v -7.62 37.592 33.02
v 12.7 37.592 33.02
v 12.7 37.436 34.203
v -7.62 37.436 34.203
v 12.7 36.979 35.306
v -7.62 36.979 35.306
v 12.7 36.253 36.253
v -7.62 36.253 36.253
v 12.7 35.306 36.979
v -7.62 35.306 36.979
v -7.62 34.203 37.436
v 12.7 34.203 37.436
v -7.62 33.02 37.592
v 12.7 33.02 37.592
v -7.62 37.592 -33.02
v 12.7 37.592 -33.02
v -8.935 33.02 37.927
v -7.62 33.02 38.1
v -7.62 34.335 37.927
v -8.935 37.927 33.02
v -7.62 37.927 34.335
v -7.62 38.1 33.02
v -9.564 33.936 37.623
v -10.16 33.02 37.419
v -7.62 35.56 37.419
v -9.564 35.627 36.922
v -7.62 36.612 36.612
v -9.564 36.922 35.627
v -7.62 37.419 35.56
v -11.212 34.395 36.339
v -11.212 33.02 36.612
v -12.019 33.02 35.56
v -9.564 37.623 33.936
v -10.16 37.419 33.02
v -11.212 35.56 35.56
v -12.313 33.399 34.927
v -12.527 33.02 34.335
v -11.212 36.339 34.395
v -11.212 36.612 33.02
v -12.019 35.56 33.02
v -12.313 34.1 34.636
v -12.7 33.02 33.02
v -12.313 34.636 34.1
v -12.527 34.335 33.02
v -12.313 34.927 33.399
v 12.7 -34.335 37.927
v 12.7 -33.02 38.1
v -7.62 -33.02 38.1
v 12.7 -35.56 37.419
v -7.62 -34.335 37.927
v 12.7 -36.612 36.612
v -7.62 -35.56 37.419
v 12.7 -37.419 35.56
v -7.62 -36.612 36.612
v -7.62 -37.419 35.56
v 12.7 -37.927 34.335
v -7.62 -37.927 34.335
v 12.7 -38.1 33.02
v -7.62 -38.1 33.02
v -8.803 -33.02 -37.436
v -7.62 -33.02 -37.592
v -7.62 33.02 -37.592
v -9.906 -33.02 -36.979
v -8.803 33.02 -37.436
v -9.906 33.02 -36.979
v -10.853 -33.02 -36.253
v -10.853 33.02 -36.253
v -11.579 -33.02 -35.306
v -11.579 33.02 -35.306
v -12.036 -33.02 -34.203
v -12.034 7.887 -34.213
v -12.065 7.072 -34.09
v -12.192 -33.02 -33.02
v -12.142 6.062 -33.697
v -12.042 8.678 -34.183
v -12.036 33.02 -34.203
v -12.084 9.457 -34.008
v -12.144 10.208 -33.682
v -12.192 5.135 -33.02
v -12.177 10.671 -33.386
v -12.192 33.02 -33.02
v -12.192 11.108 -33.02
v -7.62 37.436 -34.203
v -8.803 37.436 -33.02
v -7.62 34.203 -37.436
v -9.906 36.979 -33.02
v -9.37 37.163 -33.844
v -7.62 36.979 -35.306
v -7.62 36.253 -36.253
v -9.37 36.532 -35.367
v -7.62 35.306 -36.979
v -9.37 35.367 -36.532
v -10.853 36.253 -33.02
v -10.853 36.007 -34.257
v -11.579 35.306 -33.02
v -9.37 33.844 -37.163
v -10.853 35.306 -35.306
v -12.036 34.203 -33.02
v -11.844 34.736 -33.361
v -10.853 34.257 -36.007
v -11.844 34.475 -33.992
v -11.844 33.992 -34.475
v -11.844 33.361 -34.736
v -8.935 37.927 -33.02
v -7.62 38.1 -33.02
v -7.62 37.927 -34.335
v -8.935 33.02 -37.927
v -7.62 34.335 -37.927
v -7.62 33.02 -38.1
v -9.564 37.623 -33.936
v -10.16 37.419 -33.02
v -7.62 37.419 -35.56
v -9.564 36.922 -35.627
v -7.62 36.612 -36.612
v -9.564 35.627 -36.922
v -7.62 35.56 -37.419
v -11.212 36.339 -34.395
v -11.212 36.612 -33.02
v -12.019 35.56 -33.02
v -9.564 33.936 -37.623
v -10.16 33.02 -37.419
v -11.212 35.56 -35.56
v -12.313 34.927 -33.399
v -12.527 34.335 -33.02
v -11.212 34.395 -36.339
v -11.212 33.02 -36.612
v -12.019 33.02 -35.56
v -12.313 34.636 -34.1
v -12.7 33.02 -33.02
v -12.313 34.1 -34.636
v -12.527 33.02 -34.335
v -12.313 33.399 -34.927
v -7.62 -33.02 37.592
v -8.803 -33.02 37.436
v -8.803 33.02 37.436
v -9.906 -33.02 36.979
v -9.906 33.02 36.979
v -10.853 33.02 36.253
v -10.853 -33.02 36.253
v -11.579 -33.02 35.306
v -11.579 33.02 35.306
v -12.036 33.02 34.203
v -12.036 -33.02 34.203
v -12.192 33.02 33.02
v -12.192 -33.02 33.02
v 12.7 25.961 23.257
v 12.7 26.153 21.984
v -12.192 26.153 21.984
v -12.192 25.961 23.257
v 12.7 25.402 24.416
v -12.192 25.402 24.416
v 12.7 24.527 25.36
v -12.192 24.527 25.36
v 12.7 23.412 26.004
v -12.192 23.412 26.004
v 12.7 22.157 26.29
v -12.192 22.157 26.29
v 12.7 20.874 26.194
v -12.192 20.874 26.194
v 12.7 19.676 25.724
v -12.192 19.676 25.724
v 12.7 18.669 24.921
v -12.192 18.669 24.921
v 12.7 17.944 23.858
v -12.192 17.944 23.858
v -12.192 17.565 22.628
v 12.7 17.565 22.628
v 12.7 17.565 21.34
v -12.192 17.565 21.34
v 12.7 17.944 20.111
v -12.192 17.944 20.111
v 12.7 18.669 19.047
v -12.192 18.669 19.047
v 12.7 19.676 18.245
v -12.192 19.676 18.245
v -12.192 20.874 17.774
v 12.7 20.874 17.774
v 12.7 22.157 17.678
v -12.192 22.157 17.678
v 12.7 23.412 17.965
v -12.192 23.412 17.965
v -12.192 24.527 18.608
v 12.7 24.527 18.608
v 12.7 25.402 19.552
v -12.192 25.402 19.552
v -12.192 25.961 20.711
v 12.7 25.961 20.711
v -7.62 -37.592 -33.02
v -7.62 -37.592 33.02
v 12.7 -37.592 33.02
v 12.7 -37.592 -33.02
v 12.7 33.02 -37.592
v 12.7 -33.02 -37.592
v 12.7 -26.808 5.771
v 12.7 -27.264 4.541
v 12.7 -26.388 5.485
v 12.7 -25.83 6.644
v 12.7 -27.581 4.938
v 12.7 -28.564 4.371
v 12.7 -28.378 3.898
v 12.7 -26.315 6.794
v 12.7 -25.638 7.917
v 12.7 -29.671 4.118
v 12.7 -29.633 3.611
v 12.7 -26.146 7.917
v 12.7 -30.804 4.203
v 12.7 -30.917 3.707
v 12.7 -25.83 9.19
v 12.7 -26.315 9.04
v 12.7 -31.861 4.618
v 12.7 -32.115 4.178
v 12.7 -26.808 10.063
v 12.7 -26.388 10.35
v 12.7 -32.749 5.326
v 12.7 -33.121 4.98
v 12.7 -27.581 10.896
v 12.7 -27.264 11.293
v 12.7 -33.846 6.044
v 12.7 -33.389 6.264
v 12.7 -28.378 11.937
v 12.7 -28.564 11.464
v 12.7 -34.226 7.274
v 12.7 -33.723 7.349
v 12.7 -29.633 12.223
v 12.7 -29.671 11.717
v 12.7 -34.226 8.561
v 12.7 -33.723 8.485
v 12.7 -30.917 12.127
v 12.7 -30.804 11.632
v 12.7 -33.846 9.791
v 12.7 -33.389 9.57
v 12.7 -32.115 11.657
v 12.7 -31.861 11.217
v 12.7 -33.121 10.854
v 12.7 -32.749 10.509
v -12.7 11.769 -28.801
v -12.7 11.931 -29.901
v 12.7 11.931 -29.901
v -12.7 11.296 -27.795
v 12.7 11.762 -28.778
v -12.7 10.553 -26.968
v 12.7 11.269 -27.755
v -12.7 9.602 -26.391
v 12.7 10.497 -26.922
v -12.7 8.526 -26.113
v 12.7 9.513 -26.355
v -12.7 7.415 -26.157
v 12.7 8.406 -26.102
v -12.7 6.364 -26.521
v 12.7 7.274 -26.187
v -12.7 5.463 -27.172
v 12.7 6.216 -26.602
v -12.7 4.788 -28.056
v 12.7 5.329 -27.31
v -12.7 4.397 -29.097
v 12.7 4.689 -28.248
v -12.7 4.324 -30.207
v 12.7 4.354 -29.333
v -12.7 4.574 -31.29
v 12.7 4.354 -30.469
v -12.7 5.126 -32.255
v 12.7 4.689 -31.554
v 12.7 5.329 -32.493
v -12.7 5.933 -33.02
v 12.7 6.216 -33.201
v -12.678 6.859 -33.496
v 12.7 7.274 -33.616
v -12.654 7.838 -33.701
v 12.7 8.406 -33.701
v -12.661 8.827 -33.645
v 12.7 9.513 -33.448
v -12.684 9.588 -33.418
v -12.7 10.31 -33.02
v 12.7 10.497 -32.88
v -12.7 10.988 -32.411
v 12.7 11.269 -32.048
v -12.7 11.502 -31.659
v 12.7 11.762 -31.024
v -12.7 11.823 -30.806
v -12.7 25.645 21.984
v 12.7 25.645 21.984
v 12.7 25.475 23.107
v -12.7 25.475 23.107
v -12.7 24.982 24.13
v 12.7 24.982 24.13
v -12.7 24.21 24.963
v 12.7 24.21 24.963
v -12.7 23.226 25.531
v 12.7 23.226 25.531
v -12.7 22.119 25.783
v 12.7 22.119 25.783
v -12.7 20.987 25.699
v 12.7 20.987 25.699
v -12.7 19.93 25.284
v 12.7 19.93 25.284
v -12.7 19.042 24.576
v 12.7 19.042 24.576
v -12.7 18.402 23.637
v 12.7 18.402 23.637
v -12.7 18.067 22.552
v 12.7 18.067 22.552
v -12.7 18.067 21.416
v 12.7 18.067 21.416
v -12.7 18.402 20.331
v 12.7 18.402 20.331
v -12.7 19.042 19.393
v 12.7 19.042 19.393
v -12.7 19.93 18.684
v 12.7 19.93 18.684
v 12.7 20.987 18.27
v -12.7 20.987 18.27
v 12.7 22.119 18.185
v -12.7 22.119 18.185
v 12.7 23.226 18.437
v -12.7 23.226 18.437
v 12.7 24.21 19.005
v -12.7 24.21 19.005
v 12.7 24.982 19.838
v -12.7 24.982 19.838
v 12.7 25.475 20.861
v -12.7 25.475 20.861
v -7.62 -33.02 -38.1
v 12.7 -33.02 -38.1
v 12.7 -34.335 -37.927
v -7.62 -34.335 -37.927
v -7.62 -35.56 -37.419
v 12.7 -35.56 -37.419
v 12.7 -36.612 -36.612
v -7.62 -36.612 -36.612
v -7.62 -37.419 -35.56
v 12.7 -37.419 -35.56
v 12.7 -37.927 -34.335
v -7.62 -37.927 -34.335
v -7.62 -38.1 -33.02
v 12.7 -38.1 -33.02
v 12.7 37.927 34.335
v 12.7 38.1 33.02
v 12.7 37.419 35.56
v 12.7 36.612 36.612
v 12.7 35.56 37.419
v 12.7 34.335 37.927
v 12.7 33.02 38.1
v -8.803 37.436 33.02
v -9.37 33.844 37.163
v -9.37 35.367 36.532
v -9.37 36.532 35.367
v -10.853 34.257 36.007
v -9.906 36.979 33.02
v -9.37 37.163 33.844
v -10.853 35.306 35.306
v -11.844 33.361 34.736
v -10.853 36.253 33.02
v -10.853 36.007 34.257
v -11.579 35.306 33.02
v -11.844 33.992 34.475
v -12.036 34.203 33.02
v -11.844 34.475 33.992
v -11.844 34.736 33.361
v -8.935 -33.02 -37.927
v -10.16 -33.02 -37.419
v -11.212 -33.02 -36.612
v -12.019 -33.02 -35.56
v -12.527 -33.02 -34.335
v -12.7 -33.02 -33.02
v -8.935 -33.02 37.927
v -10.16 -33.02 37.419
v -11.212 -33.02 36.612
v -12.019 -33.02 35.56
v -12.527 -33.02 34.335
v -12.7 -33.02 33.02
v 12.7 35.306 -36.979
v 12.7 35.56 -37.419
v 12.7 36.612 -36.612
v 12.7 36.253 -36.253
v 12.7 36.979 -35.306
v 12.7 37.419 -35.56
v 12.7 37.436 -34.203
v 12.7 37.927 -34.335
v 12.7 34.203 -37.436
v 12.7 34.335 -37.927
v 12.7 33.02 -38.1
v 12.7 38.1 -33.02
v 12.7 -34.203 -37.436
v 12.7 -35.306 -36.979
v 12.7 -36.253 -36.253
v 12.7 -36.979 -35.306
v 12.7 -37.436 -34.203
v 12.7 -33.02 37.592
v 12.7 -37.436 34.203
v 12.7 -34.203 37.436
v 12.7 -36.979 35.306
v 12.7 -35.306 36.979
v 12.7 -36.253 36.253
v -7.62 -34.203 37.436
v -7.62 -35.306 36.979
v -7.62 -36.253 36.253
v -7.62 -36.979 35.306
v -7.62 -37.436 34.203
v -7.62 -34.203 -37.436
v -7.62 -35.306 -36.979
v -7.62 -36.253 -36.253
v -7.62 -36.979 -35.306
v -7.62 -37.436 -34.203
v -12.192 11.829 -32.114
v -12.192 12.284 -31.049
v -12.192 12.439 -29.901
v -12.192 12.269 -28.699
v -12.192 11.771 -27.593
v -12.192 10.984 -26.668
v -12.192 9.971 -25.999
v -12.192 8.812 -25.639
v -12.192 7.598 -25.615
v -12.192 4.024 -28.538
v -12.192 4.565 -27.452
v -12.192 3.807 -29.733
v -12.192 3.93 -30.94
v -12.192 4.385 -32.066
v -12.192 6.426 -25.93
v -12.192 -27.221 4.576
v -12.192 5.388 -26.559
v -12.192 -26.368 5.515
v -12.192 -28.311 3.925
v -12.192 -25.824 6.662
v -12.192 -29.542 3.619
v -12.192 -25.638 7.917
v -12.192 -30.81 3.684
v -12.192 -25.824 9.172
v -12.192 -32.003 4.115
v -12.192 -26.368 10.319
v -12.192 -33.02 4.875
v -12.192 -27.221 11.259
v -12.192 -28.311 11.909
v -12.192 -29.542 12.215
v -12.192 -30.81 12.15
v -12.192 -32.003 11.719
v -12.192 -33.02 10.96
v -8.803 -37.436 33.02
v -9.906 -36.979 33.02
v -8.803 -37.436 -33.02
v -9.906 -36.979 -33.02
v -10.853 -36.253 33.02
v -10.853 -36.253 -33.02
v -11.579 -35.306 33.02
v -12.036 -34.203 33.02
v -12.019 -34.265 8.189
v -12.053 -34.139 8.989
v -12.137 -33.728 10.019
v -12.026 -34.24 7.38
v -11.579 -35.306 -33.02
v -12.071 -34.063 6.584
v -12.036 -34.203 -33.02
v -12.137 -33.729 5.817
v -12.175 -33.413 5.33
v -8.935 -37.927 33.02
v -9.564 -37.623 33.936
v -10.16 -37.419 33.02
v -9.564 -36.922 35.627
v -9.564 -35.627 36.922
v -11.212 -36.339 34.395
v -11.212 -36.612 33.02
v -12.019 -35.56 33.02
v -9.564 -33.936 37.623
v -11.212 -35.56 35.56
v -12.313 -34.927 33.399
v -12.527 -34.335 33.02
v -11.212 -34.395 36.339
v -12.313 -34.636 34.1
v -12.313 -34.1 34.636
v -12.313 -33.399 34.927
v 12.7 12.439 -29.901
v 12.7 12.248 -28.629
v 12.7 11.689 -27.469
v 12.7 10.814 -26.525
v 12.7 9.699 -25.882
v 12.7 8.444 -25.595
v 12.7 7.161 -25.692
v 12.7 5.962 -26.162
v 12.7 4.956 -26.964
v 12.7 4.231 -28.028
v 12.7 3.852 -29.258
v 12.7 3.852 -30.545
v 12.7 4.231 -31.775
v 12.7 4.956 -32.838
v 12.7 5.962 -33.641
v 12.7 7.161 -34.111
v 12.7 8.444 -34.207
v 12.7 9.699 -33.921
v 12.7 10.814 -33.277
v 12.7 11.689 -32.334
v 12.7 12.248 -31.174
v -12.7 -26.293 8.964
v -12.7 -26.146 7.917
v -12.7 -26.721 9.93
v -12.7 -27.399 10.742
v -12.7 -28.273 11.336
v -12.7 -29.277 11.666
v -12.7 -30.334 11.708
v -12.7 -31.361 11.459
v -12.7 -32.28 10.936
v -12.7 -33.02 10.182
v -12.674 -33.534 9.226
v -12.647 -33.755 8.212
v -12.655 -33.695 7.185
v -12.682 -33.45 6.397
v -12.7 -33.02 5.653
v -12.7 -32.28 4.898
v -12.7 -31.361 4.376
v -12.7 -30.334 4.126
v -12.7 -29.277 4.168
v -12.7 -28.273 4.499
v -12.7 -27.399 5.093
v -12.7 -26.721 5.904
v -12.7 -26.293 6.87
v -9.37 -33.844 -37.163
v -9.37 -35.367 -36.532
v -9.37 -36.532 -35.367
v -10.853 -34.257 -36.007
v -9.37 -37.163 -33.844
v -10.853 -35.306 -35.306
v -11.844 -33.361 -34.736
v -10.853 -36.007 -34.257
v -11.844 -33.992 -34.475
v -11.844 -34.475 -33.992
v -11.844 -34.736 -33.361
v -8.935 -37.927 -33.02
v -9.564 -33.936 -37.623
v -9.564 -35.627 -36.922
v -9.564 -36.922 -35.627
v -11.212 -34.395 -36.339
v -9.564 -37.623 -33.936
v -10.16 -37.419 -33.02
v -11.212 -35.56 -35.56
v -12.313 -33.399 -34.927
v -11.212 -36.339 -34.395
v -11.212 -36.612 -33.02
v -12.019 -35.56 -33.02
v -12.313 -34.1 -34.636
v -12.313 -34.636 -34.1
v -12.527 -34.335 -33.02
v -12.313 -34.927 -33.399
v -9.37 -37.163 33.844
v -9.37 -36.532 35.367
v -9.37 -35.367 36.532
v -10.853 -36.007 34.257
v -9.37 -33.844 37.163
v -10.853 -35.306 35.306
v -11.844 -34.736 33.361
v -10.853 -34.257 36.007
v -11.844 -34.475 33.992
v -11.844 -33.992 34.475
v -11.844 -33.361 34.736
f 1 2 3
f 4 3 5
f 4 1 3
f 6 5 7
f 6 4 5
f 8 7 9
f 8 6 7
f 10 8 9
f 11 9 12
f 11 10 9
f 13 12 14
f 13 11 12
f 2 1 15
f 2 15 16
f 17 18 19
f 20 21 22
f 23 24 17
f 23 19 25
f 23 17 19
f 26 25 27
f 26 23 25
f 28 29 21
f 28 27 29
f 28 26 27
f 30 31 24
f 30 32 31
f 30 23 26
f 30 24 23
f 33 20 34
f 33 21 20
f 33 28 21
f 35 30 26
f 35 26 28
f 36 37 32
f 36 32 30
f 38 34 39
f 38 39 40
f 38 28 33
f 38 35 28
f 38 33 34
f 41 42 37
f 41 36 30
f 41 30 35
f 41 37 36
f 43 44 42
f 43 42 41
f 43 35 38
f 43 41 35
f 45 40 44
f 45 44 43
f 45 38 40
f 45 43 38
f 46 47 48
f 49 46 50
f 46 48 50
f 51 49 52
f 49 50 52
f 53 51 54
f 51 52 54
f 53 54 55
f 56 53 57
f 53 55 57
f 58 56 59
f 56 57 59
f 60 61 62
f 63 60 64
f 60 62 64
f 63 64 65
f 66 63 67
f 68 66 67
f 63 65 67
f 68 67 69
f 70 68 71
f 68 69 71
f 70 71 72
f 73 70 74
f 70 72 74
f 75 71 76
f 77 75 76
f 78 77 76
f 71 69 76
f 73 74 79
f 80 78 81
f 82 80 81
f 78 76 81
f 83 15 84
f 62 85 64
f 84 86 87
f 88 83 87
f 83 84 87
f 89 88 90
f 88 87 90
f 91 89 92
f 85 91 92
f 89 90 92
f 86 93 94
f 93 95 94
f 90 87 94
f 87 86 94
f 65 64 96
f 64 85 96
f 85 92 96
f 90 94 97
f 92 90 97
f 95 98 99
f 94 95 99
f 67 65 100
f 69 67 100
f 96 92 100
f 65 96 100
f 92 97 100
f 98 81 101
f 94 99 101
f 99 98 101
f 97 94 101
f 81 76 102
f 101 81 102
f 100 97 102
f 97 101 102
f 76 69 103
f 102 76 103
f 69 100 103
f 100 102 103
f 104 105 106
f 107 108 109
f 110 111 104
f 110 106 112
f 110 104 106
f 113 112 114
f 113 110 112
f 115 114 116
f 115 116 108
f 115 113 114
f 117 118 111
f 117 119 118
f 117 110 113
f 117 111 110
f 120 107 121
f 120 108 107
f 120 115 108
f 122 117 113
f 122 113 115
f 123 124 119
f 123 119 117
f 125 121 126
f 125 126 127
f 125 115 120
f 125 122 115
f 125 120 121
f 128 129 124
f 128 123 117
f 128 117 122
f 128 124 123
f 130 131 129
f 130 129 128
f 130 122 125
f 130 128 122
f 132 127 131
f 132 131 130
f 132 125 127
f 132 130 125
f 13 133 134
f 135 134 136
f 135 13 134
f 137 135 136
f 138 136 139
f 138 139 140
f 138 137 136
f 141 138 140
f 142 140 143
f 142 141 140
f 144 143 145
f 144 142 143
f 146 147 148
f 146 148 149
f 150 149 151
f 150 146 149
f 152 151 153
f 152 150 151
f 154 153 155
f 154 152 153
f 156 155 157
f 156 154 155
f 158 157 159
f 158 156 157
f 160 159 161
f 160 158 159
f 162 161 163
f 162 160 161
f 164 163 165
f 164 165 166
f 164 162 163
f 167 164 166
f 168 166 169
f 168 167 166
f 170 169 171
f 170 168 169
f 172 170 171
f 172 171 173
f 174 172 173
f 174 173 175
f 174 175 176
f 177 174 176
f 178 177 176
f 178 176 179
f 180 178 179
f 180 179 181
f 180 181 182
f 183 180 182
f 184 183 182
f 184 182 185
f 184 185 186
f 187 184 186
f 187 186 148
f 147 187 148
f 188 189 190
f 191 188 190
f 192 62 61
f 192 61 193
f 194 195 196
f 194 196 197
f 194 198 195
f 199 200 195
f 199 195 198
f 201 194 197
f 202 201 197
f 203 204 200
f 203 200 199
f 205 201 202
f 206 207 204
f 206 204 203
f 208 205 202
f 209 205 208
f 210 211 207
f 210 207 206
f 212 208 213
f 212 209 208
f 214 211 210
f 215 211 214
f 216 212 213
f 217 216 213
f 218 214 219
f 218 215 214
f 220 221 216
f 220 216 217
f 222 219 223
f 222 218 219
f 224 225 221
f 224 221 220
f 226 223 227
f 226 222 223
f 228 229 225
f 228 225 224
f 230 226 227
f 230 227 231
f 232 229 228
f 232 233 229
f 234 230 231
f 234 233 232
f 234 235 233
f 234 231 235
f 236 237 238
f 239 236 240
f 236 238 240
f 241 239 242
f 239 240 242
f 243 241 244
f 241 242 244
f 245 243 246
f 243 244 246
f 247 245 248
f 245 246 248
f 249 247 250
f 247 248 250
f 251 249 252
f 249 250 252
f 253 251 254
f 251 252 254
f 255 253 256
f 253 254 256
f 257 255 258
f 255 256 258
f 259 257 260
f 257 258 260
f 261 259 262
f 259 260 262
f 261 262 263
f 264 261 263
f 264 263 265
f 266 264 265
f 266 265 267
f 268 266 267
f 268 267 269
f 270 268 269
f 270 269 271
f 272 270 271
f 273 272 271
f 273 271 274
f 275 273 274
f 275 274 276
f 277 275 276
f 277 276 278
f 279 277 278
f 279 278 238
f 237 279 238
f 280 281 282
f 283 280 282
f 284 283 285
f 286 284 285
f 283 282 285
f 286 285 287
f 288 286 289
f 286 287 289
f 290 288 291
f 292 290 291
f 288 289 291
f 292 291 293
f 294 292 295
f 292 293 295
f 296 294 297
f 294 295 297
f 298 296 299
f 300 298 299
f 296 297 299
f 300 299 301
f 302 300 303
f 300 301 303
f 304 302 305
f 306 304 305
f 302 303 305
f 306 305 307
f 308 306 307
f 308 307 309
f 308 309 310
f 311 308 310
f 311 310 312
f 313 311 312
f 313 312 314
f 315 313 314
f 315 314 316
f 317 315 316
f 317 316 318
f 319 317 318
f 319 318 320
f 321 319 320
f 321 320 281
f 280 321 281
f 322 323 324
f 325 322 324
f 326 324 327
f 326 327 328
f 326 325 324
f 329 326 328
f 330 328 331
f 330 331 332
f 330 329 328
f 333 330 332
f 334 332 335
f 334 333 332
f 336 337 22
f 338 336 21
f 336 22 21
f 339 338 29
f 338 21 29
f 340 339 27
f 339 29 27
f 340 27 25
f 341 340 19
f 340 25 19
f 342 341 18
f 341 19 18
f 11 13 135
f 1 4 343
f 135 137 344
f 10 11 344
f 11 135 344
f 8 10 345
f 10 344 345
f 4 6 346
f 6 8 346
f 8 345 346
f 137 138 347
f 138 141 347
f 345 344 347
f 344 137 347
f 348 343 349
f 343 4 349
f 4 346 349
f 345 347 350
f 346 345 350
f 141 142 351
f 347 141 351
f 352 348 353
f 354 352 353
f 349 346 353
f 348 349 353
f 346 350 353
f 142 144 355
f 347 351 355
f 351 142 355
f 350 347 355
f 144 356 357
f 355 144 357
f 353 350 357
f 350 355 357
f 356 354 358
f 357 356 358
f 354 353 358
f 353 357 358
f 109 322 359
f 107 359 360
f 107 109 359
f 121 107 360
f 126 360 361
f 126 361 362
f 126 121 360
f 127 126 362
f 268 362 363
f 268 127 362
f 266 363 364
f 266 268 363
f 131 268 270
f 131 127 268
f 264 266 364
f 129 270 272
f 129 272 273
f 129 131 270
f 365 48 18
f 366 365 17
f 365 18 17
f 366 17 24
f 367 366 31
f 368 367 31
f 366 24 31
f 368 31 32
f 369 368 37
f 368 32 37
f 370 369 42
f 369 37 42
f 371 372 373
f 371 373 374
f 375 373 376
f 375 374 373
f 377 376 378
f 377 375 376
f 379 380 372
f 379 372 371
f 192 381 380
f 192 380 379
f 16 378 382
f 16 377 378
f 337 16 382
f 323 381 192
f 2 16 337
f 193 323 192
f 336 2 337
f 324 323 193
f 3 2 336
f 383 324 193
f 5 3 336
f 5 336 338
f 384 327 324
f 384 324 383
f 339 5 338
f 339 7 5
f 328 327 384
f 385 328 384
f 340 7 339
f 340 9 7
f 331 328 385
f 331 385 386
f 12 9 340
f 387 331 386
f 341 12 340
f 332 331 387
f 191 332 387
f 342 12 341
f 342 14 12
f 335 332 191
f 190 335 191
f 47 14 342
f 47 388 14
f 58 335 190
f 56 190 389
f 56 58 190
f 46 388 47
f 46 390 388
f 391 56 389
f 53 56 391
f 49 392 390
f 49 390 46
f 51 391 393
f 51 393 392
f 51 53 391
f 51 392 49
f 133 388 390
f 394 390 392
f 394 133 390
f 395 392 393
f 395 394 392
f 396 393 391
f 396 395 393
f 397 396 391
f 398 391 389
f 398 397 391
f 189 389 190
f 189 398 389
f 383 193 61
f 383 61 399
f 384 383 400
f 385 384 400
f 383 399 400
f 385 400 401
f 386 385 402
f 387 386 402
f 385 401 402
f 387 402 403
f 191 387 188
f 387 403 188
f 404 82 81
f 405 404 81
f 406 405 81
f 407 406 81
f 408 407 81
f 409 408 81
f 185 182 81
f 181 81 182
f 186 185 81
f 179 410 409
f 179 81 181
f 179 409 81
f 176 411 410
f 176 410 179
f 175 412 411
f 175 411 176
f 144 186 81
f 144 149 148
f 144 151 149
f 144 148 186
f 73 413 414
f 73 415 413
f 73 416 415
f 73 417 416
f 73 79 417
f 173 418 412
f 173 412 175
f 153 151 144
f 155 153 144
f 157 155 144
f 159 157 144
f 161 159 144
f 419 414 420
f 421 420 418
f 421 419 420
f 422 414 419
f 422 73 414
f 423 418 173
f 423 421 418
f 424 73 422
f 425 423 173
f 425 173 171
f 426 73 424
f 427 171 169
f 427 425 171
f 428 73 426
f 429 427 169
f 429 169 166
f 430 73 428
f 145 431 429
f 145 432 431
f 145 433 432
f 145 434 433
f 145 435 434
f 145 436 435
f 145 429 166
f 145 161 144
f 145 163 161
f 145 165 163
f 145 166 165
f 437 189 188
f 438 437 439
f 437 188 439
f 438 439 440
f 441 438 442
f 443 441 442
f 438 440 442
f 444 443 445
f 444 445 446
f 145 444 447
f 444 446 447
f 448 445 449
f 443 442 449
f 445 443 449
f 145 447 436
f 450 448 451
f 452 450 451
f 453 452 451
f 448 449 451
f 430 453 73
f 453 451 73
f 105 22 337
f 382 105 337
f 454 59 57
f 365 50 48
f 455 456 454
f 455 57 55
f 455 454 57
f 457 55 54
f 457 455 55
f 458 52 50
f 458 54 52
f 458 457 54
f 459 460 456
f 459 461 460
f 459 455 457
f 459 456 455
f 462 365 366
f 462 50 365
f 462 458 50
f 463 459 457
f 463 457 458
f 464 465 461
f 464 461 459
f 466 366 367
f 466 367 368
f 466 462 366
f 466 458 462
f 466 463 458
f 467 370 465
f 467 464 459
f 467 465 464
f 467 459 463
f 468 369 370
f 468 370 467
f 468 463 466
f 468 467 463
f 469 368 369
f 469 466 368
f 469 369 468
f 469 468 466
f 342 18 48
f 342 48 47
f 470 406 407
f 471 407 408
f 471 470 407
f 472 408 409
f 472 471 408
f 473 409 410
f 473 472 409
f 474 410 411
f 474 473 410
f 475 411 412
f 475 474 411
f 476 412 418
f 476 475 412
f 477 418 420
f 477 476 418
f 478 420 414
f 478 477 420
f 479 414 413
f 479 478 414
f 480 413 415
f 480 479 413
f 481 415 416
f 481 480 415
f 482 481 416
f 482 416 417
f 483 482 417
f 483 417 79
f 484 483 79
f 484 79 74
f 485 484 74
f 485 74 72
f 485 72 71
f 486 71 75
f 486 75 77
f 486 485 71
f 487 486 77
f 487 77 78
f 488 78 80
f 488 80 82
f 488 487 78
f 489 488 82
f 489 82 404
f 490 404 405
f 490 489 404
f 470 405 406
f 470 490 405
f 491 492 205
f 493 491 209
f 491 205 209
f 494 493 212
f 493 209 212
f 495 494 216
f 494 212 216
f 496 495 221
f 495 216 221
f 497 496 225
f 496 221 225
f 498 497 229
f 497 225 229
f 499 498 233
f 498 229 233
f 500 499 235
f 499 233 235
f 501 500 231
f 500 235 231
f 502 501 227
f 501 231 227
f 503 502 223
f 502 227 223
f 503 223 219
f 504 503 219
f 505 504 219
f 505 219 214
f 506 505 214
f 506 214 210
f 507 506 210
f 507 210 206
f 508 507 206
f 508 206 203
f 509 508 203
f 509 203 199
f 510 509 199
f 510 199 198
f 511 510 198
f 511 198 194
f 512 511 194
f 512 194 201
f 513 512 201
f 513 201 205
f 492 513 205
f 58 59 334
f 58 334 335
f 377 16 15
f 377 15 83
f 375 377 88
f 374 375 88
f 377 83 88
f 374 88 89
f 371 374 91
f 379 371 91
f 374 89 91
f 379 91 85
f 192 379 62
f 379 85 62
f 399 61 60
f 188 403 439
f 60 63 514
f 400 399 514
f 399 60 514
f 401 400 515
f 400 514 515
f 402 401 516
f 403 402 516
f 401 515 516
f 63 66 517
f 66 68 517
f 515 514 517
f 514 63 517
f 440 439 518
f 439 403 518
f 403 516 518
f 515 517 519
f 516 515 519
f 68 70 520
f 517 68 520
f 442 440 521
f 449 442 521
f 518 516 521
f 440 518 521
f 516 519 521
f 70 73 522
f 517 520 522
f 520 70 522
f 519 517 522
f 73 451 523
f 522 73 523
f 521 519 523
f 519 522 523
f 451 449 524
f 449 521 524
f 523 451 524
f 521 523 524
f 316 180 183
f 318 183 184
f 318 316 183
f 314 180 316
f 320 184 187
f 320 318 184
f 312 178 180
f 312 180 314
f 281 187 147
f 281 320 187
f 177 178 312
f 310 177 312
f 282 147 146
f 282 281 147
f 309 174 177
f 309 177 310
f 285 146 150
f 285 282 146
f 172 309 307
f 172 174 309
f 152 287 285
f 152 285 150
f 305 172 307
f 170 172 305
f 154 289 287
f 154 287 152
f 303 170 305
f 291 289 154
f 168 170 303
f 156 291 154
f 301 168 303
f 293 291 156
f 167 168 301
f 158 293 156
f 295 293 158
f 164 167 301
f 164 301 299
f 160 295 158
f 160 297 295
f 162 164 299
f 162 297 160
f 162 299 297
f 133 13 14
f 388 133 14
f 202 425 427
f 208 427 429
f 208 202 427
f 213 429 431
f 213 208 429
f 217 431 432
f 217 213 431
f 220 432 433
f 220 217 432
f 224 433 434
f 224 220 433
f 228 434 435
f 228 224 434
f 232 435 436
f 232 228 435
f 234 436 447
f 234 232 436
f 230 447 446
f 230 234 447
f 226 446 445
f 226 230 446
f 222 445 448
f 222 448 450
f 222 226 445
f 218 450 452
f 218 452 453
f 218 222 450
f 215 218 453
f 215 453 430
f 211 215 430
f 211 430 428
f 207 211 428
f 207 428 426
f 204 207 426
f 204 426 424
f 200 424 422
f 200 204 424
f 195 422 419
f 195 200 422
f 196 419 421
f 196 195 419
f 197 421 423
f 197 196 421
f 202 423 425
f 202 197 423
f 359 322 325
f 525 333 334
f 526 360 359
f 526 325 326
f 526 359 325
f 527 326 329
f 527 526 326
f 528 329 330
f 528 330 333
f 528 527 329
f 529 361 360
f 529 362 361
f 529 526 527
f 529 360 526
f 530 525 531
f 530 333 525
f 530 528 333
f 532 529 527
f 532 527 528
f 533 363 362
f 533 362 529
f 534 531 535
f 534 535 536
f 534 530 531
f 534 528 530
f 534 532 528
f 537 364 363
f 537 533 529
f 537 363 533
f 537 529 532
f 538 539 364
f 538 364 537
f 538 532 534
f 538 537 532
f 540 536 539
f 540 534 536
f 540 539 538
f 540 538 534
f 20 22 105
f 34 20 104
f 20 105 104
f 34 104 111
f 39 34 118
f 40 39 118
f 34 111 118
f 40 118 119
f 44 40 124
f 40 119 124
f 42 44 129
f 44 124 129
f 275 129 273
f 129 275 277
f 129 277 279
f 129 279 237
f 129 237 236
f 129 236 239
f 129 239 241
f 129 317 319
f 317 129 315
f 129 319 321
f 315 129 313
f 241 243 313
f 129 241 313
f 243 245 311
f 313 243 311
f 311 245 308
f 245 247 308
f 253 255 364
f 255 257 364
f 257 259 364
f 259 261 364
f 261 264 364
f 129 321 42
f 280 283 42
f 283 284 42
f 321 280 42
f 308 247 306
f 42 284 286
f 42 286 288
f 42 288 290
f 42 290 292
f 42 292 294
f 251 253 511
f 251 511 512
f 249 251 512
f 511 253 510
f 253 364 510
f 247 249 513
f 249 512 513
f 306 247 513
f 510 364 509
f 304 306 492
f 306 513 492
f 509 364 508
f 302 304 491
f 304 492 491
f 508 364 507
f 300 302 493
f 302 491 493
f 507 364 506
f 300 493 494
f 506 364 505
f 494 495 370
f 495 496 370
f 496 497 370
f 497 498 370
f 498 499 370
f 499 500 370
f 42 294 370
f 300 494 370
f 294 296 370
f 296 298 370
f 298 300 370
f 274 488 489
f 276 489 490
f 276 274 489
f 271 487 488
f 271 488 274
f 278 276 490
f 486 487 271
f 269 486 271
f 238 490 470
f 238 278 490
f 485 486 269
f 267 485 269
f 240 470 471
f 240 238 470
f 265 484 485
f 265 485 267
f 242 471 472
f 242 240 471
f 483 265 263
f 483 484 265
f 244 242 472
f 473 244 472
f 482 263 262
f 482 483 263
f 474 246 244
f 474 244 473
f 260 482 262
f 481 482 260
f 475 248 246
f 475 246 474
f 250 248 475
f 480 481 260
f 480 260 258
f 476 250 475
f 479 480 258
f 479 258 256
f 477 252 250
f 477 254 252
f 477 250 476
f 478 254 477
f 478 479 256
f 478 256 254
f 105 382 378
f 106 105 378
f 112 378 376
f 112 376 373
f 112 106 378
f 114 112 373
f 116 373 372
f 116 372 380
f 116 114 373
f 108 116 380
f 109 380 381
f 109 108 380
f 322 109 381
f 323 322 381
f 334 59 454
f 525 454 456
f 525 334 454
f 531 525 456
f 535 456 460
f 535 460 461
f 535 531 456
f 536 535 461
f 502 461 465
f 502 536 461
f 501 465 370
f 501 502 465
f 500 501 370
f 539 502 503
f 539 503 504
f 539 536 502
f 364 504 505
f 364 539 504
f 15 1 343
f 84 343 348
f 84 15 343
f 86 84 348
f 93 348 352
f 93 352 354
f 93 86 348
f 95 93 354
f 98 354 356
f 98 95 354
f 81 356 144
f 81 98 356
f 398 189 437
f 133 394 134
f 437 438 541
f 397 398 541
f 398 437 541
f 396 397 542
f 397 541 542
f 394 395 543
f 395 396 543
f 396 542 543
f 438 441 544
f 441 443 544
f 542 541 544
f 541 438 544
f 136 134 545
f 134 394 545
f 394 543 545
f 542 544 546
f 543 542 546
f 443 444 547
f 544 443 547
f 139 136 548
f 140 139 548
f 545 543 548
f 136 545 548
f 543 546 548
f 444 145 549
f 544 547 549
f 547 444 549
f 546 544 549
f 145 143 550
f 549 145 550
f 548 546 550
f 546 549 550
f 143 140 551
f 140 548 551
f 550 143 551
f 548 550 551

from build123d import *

# Parameters (mm, degrees)
F0_W         = 25.4
F0_H         = 76.2
F1_DEPTH     = 38.1
F3_D         = 7.62
F4_T1_DEPTH  = 66.04
F4_T3_DEPTH  = 66.04
F4_T5_DEPTH  = 33.02
F4_S9_W      = 5.08
F4_S9_H      = 5.08
F4_T10_DEPTH = 5.08
F4_S15_W     = 5.08
F4_S15_H     = 5.08
F4_T16_DEPTH = 5.08
F4_S21_W     = 5.08
F4_S21_H     = 5.08
F4_T22_DEPTH = 5.08
F4_S27_W     = 5.08
F4_S27_H     = 5.08
F4_T28_DEPTH = 5.08
F5_T         = -0.508


# Not quite as in the source:
# - a fillet or chamfer that OpenCascade refuses, or shapes differently, is made with other operations: its cross-section is extruded or revolved along the edge and cut away or added


with BuildPart() as f1:
    # F0 (on Front) → F1 (new body, symmetric)
    with BuildSketch(Plane.XZ):
        Rectangle(F0_W, F0_H)
    extrude(amount=F1_DEPTH, both=True)

    # F3 (through all)
    with Locations(Plane(origin=(-12.7, 0, 0), x_dir=(0, -1, 0), z_dir=(-1, 0, 0))):
        with Locations((29.9560025906, 7.917207202), (-21.8345038593, 21.9840556383), (-8.1214987313, -29.9012628403)):
            Hole(F3_D / 2)

    # F4: fillet of radius 5.08 on 8 edges, made by hand

    # F4_s2 → F4_t1 (cut)
    with BuildSketch(Plane.XZ.offset(-33.02)):
        with BuildLine():
            ThreePointArc((-7.62, 38.1), (-11.2121024484, 36.6121024484), (-12.7, 33.02))
            Line((-12.7, 33.02), (-12.7, 38.1))
            Line((-12.7, 38.1), (-7.62, 38.1))
        make_face()
        with BuildLine():
            ThreePointArc((-7.62, -38.1), (-11.2121024484, -36.6121024484), (-12.7, -33.02))
            Line((-12.7, -33.02), (-12.7, -38.1))
            Line((-12.7, -38.1), (-7.62, -38.1))
        make_face()
    extrude(amount=F4_T1_DEPTH, mode=Mode.SUBTRACT)

    # F4_s4 → F4_t3 (cut)
    with BuildSketch(Plane.XY.offset(-33.02)):
        with BuildLine():
            ThreePointArc((-7.62, 38.1), (-11.2121024484, 36.6121024484), (-12.7, 33.02))
            Line((-12.7, 33.02), (-12.7, 38.1))
            Line((-12.7, 38.1), (-7.62, 38.1))
        make_face()
        with BuildLine():
            ThreePointArc((-7.62, -38.1), (-11.2121024484, -36.6121024484), (-12.7, -33.02))
            Line((-12.7, -33.02), (-12.7, -38.1))
            Line((-12.7, -38.1), (-7.62, -38.1))
        make_face()
    extrude(amount=F4_T3_DEPTH, mode=Mode.SUBTRACT)

    # F4_s6 → F4_t5 (cut)
    with BuildSketch(Plane.YZ.offset(-7.62)):
        with BuildLine():
            ThreePointArc((38.1, 33.02), (36.6121024484, 36.6121024484), (33.02, 38.1))
            Line((33.02, 38.1), (38.1, 38.1))
            Line((38.1, 38.1), (38.1, 33.02))
        make_face()
        with BuildLine():
            ThreePointArc((38.1, -33.02), (36.6121024484, -36.6121024484), (33.02, -38.1))
            Line((33.02, -38.1), (38.1, -38.1))
            Line((38.1, -38.1), (38.1, -33.02))
        make_face()
        with BuildLine():
            ThreePointArc((-33.02, 38.1), (-36.6121024484, 36.6121024484), (-38.1, 33.02))
            Line((-38.1, 33.02), (-38.1, 38.1))
            Line((-38.1, 38.1), (-33.02, 38.1))
        make_face()
        with BuildLine():
            ThreePointArc((-33.02, -38.1), (-36.6121024484, -36.6121024484), (-38.1, -33.02))
            Line((-38.1, -33.02), (-38.1, -38.1))
            Line((-38.1, -38.1), (-33.02, -38.1))
        make_face()
    extrude(amount=F4_T5_DEPTH, mode=Mode.SUBTRACT)


with BuildPart() as f4_tool8:
    # F4_s9 → F4_t10 (new body)
    with BuildSketch(Plane.YZ.offset(-7.62)):
        with Locations((35.56, 35.56)):
            Rectangle(F4_S9_W, F4_S9_H)
    extrude(amount=-F4_T10_DEPTH)

    # F4_s11 → F4_t12 (revolve, cut)
    with BuildSketch(Plane(origin=(-7.62, 33.02, 33.02), x_dir=(0, -0.7071067812, -0.7071067812), z_dir=(0, 0.7071067812, -0.7071067812))):
        with BuildLine():
            ThreePointArc((0, -5.08), (5.08, 0), (0, 5.08))
            Line((0, 5.08), (0, -5.08))
        make_face()
    revolve(axis=Axis((-7.62, 33.02, 33.02), (-1, 0, 0)), mode=Mode.SUBTRACT)


with BuildPart() as f1_1:
    add(f1.part)

    # F4_t7: cut F4_tool8
    add(f4_tool8.part, mode=Mode.SUBTRACT)


with BuildPart() as f4_tool14:
    # F4_s15 → F4_t16 (new body)
    with BuildSketch(Plane.YZ.offset(-7.62)):
        with Locations((-35.56, 35.56)):
            Rectangle(F4_S15_W, F4_S15_H)
    extrude(amount=-F4_T16_DEPTH)

    # F4_s17 → F4_t18 (revolve, cut)
    with BuildSketch(Plane(origin=(-7.62, -33.02, 33.02), x_dir=(0, 0.7071067812, -0.7071067812), z_dir=(0, 0.7071067812, 0.7071067812))):
        with BuildLine():
            ThreePointArc((0, -5.08), (5.08, 0), (0, 5.08))
            Line((0, 5.08), (0, -5.08))
        make_face()
    revolve(axis=Axis((-7.62, -33.02, 33.02), (-1, 0, 0)), mode=Mode.SUBTRACT)


with BuildPart() as f1_2:
    add(f1_1.part)

    # F4_t13: cut F4_tool14
    add(f4_tool14.part, mode=Mode.SUBTRACT)


with BuildPart() as f4_tool20:
    # F4_s21 → F4_t22 (new body)
    with BuildSketch(Plane.YZ.offset(-7.62)):
        with Locations((35.56, -35.56)):
            Rectangle(F4_S21_W, F4_S21_H)
    extrude(amount=-F4_T22_DEPTH)

    # F4_s23 → F4_t24 (revolve, cut)
    with BuildSketch(Plane(origin=(-7.62, 33.02, -33.02), x_dir=(0, -0.7071067812, 0.7071067812), z_dir=(0, -0.7071067812, -0.7071067812))):
        with BuildLine():
            ThreePointArc((0, -5.08), (5.08, 0), (0, 5.08))
            Line((0, 5.08), (0, -5.08))
        make_face()
    revolve(axis=Axis((-7.62, 33.02, -33.02), (-1, 0, 0)), mode=Mode.SUBTRACT)


with BuildPart() as f1_3:
    add(f1_2.part)

    # F4_t19: cut F4_tool20
    add(f4_tool20.part, mode=Mode.SUBTRACT)


with BuildPart() as f4_tool26:
    # F4_s27 → F4_t28 (new body)
    with BuildSketch(Plane.YZ.offset(-7.62)):
        with Locations((-35.56, -35.56)):
            Rectangle(F4_S27_W, F4_S27_H)
    extrude(amount=-F4_T28_DEPTH)

    # F4_s29 → F4_t30 (revolve, cut)
    with BuildSketch(Plane(origin=(-7.62, -33.02, -33.02), x_dir=(0, 0.7071067812, 0.7071067812), z_dir=(0, -0.7071067812, 0.7071067812))):
        with BuildLine():
            ThreePointArc((0, -5.08), (5.08, 0), (0, 5.08))
            Line((0, 5.08), (0, -5.08))
        make_face()
    revolve(axis=Axis((-7.62, -33.02, -33.02), (-1, 0, 0)), mode=Mode.SUBTRACT)


with BuildPart() as f1_4:
    add(f1_3.part)

    # F4_t25: cut F4_tool26
    add(f4_tool26.part, mode=Mode.SUBTRACT)

    # F5
    f5_openings = [f1_4.faces().sort_by_distance(p)[0] for p in [
        (12.7, 0, 0),
    ]]
    offset(amount=F5_T, openings=f5_openings)


solid = f1_4.part
